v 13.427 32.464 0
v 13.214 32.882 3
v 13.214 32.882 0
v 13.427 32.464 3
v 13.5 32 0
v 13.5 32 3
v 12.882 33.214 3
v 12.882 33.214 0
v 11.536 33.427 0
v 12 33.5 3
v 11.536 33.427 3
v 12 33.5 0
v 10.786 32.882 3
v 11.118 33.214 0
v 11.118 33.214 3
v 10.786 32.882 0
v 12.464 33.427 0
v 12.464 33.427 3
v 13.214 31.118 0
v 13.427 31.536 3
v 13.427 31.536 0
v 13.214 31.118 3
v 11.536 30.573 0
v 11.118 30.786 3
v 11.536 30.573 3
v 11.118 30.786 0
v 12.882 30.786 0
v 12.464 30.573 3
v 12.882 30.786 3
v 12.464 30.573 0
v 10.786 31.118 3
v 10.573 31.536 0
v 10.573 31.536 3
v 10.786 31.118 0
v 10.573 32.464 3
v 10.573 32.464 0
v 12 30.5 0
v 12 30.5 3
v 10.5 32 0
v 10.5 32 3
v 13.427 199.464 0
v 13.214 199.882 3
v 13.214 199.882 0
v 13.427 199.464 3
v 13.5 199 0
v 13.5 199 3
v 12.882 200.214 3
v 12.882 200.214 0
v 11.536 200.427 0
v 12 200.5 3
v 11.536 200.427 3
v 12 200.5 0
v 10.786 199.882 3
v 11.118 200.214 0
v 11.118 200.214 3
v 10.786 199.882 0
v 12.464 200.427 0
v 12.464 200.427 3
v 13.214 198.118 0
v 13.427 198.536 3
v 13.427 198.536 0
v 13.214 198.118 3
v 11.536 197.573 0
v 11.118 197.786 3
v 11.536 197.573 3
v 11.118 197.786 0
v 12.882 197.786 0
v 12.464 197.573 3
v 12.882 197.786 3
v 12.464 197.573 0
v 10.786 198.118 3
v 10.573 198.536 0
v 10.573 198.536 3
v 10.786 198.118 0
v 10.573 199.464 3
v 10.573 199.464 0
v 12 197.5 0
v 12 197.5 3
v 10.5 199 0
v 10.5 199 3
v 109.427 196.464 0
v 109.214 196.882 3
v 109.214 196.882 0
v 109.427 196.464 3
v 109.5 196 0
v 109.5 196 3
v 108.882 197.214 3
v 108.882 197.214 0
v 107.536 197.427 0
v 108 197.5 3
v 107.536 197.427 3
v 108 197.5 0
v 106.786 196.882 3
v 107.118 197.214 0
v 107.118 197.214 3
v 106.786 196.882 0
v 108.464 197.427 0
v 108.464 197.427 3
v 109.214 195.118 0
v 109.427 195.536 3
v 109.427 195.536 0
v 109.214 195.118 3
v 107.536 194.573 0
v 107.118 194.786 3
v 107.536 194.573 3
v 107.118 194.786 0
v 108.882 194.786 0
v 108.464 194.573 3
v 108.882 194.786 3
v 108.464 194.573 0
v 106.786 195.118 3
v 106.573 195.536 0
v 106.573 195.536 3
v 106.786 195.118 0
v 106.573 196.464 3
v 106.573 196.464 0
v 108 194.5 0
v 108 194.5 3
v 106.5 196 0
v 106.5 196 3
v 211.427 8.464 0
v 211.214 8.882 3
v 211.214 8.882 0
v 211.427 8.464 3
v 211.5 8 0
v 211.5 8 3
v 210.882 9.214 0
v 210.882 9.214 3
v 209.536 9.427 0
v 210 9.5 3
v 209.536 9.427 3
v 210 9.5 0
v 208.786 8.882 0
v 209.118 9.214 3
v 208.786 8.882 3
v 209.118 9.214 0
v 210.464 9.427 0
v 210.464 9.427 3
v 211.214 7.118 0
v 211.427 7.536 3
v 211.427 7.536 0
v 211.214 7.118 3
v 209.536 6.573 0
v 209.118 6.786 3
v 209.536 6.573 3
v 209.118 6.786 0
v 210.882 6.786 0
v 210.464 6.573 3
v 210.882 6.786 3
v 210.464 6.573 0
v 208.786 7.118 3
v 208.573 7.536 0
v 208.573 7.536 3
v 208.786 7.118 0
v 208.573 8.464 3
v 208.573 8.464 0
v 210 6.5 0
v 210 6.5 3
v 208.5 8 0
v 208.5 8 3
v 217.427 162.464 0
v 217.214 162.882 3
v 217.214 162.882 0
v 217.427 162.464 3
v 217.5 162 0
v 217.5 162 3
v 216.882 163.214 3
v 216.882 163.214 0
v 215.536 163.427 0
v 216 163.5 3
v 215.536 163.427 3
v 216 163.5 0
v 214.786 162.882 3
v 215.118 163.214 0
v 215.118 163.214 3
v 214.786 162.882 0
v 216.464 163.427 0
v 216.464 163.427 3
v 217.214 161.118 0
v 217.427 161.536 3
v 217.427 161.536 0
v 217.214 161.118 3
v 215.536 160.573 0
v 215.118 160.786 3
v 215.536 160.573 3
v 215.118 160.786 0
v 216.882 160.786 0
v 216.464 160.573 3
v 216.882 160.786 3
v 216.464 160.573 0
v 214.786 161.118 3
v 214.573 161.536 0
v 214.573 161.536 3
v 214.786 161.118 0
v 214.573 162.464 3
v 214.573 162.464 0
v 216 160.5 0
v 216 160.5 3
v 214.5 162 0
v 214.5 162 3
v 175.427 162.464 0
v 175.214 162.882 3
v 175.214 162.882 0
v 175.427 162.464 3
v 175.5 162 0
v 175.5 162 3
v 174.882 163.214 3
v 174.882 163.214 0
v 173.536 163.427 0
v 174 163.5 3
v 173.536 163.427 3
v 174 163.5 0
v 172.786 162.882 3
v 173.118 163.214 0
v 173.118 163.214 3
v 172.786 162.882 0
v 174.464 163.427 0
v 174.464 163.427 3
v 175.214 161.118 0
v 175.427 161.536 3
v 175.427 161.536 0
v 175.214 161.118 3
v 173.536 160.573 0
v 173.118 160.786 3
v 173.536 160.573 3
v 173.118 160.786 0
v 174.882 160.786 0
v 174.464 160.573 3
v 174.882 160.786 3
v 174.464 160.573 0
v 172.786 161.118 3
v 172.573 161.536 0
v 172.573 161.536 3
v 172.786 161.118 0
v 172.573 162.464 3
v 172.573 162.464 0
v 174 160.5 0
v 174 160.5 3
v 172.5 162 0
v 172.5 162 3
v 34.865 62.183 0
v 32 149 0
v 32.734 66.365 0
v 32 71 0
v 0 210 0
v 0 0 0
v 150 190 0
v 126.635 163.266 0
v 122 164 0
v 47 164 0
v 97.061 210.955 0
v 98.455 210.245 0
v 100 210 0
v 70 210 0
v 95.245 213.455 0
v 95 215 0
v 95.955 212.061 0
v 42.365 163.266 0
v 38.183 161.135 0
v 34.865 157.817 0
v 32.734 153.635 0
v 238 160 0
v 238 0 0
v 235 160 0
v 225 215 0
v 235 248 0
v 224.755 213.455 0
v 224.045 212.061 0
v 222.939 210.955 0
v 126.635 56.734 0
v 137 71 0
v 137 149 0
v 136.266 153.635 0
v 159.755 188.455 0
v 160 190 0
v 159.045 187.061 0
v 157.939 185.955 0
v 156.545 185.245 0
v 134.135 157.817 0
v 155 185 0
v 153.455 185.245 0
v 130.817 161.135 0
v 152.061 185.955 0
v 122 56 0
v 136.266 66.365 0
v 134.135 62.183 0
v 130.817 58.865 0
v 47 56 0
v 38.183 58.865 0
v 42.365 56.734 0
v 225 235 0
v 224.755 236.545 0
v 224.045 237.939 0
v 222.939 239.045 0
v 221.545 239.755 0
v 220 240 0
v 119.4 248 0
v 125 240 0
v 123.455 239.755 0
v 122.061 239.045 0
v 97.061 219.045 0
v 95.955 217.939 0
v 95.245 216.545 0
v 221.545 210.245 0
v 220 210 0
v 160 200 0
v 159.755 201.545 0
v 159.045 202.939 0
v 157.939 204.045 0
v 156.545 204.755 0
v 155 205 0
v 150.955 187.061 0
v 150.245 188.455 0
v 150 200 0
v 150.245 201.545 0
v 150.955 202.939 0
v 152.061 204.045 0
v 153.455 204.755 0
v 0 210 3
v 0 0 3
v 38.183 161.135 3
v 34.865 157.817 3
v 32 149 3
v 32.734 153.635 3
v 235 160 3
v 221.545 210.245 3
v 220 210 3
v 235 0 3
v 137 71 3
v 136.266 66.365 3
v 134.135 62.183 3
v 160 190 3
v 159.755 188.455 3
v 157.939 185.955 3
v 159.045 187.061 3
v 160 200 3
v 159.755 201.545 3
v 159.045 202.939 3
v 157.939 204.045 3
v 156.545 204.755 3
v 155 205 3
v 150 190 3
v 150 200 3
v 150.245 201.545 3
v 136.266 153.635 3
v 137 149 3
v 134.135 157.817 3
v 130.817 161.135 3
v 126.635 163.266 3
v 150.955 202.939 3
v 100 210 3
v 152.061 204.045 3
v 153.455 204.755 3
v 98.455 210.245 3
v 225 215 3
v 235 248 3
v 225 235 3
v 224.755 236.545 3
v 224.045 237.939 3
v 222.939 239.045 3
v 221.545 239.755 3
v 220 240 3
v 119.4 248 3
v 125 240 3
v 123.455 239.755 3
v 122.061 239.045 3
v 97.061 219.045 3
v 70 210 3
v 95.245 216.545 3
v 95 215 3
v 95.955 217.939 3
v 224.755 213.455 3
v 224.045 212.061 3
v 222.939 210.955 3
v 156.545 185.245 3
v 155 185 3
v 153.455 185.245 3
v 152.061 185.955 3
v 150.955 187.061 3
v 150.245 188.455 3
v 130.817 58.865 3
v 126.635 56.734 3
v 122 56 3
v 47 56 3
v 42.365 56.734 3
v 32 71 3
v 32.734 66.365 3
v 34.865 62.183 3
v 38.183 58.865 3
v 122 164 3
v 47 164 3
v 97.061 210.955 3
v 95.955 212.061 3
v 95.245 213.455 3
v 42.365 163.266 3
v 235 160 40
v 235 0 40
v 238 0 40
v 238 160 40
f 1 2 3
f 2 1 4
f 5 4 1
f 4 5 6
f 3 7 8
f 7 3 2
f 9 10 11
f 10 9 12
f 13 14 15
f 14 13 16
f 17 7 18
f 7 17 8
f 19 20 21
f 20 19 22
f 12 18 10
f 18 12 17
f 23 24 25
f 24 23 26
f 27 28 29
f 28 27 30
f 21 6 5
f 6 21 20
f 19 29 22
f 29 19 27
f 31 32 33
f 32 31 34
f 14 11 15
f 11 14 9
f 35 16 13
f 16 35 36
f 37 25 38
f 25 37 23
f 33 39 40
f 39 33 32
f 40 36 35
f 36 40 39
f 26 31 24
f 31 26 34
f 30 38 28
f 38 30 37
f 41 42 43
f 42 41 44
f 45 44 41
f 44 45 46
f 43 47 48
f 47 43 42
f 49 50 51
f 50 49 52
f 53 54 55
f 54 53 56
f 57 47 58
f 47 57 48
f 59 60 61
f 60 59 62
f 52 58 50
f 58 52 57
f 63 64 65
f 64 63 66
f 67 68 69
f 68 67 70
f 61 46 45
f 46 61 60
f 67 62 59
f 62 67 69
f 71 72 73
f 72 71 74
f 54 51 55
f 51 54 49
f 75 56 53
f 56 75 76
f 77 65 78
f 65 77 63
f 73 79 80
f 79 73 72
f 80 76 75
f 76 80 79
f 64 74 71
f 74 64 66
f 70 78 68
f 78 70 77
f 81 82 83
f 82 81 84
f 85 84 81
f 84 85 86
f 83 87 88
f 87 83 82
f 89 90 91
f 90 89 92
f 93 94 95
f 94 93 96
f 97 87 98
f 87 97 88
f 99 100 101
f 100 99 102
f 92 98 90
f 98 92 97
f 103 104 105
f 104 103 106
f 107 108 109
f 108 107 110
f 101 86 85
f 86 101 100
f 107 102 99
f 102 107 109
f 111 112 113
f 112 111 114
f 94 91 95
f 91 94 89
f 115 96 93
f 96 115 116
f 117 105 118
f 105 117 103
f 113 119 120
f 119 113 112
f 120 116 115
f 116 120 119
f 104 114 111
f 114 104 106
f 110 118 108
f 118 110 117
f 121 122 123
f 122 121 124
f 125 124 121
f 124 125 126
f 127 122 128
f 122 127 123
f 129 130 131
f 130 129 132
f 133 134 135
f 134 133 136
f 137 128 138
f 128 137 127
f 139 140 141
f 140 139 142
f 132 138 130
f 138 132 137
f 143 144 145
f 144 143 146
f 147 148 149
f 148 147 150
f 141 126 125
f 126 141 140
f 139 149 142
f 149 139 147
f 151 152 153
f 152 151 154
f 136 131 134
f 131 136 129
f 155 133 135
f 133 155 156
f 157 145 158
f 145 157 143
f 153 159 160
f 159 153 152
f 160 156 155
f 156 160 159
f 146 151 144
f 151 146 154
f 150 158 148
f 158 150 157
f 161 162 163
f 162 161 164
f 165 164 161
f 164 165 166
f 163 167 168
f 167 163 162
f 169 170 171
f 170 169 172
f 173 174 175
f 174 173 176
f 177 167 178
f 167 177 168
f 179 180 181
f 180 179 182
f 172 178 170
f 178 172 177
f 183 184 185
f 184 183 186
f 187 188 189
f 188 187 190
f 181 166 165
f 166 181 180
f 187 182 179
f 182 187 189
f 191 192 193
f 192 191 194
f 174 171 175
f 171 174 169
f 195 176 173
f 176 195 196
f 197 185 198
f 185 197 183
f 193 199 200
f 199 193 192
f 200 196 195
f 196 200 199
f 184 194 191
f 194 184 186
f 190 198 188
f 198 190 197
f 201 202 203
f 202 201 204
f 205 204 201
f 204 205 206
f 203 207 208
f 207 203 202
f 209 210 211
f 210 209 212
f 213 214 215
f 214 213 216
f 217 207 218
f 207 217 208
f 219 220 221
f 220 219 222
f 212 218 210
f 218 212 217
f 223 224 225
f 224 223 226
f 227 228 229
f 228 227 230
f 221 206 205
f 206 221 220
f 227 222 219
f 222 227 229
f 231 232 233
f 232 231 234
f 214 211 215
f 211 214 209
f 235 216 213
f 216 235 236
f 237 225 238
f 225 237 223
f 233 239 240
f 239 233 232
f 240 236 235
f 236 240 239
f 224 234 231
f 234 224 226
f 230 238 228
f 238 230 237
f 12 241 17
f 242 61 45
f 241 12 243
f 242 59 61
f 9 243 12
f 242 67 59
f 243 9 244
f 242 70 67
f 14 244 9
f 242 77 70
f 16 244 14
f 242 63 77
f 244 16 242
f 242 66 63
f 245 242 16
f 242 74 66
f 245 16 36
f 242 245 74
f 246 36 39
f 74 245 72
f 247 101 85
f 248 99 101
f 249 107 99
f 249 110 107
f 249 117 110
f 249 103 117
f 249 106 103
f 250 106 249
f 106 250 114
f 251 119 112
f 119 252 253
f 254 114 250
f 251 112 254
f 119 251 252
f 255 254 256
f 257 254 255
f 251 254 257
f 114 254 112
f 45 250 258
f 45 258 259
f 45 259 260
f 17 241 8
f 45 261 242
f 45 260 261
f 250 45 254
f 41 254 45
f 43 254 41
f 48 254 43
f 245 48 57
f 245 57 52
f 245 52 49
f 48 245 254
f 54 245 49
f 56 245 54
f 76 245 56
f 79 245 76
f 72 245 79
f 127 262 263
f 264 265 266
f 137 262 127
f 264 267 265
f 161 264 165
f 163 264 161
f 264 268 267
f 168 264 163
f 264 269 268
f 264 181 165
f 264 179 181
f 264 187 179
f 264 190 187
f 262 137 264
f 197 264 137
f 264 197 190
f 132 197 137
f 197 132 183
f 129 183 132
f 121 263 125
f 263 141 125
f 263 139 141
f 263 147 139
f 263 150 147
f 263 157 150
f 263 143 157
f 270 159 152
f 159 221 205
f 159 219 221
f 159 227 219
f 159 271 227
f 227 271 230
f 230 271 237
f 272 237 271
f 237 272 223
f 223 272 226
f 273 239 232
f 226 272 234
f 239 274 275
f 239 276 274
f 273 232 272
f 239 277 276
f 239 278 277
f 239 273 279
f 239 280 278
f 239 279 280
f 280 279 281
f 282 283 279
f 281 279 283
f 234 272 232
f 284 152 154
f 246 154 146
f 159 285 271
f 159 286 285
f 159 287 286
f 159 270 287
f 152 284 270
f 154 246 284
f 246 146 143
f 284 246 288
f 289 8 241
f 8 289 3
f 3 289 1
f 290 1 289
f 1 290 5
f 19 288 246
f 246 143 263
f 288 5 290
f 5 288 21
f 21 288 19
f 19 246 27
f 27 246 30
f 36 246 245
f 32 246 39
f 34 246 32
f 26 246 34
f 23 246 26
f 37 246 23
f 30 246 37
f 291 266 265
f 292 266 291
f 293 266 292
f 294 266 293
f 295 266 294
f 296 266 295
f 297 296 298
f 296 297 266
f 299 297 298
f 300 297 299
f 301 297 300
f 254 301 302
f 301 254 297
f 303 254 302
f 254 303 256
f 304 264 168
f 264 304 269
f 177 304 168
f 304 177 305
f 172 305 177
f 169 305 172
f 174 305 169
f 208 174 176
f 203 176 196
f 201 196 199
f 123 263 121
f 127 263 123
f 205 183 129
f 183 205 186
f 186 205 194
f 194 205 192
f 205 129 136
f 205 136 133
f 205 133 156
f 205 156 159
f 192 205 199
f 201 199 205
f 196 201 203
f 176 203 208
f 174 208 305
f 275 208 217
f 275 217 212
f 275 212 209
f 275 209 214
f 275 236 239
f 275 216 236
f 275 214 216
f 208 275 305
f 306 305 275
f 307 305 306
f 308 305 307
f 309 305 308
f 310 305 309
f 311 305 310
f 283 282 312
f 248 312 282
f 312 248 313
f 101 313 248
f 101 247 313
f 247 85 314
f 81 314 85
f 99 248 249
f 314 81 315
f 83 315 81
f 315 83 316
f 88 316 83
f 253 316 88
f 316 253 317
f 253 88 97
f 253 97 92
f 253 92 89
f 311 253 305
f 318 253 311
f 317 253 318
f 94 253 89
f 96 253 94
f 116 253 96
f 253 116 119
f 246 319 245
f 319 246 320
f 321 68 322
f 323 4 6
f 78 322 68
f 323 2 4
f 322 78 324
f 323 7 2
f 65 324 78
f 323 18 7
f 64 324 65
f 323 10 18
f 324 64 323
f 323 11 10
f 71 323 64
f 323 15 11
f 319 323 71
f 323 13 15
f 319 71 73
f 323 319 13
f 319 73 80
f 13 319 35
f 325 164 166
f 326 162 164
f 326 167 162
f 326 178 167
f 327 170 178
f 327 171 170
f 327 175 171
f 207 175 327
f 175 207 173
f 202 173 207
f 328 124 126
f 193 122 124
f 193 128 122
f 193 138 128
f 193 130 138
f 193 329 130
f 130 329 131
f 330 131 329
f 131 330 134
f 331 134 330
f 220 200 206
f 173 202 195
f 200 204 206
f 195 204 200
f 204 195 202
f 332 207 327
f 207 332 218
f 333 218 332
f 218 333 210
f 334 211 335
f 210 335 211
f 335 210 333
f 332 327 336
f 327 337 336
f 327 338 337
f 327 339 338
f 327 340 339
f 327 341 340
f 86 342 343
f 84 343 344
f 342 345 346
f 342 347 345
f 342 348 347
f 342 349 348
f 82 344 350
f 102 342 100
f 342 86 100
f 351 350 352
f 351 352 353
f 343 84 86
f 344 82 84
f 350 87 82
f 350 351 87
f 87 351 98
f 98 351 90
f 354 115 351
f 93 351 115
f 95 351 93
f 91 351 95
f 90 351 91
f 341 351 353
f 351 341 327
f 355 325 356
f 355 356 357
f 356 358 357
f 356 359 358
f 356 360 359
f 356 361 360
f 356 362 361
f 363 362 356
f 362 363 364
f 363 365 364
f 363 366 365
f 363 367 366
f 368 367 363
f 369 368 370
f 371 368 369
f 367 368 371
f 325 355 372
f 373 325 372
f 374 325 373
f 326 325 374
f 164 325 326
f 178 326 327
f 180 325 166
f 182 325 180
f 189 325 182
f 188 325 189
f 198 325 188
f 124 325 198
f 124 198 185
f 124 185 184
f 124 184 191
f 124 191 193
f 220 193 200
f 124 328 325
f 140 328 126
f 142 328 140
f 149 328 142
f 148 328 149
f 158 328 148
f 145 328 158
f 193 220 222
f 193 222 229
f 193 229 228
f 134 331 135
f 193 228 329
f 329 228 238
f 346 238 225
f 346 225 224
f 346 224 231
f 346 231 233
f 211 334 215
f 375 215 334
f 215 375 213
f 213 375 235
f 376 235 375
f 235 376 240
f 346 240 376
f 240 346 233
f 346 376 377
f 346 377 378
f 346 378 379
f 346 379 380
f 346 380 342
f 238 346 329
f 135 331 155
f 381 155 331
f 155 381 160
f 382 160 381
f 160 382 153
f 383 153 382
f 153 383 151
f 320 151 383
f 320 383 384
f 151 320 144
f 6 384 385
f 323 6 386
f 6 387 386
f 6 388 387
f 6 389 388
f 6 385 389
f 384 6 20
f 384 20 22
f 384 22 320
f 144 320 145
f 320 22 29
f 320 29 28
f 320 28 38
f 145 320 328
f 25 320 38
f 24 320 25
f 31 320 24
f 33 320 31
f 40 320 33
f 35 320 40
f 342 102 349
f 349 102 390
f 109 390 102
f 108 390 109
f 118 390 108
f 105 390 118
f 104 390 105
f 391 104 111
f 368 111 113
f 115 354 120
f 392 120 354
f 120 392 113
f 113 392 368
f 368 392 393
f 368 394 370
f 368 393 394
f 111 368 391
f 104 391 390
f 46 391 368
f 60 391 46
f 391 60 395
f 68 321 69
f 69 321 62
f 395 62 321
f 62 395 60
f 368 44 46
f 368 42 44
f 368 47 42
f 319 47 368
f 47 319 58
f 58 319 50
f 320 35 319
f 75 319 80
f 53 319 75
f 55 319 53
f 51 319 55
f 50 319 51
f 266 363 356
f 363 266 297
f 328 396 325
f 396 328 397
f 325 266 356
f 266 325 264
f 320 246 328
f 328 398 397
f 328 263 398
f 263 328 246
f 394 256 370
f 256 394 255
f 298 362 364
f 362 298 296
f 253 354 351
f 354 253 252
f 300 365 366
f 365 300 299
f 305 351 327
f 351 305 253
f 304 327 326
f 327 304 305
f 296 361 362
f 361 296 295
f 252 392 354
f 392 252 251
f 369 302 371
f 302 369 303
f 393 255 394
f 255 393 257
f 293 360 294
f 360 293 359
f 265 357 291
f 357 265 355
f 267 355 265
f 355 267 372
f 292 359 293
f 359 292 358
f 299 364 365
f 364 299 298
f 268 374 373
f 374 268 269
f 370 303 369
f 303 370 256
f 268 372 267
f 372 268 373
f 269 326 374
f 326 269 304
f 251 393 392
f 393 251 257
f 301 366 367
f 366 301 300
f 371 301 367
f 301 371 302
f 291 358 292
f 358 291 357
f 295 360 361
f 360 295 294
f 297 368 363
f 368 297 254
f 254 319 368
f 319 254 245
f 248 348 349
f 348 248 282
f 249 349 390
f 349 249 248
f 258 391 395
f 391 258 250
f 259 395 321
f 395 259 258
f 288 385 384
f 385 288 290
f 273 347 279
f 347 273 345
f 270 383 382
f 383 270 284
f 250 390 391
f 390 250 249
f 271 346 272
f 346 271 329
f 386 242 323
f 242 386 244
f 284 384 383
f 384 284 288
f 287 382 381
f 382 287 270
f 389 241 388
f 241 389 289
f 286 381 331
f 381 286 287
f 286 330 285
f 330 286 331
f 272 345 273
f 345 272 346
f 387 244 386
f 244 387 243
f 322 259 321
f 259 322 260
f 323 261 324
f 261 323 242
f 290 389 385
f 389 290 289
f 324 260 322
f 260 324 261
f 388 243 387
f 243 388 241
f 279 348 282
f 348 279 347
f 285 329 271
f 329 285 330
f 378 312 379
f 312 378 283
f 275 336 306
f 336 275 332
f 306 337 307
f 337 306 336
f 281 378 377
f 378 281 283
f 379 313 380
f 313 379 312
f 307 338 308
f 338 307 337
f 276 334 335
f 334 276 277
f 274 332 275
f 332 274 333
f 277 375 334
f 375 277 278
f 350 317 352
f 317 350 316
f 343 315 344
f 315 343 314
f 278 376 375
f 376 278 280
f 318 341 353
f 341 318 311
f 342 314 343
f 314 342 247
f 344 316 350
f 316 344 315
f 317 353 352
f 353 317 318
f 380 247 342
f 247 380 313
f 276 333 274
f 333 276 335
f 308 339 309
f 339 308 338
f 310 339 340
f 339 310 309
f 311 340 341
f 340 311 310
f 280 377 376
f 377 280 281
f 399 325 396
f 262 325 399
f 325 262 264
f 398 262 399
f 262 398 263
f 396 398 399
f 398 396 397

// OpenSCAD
// file: ssd.scad
module ssd(h){

    difference(){

        translate([5,5]){
            linear_extrude(h){
                minkowski(){
                    square([59.85, 90.45]);
                    circle(5);
                }
            }
        }

        translate([12,-1,-1])
            cube([33.69, 3.25, 6]);

    }

}
// file: optiplexmotherboard.scad
volt  = 2;
cpu_volt  = 20;
mobo_h = 1.57;


$fn = 25;


module mobo_contour(){
    linear_extrude(height=mobo_h)
        polygon(points=[[0,0],[220,0],[220,186],[146,186],[146,205],[0,205]]);

}

psu_bolt = [220-49,186-24];
bolts =  [[9,32], [9,205-6], 
          [0+105,205-9], [220-13,0+8],
          [220-7,186-24], [220-49,186-24], psu_bolt];
cpu_bolts =  [[44,71],
              [44,149], 
              [220-101,71],
              [220-101,149]];

module mobo(){

    difference( ) {
         
        mobo_contour();
        
        for (pos = bolts){
            translate(pos) 
                cylinder(  r=volt, h=100, center=true);
        }
        
        for (pos = cpu_bolts){
            translate(pos) 
                cylinder(  r=volt, h=100, center=true);
        }
    }
}
// main file
include <optiplexmotherboard.scad>
include <ssd.scad>

$fn = 20;

board_offset = [3, 0];
blade_thickness = 3;
standof_h = 5;

// the blade itself
difference(){
    

    linear_extrude(height=blade_thickness)
        square([235,248]);

    hull(){
        translate([220,215])
            cylinder(r=5, h=15, center=true);
        translate([220,235])
            cylinder(r=5, h=15, center=true);
        translate([100,215])
            cylinder(r=5, h=15, center=true);          
        translate([125,235])
            cylinder(r=5, h=15, center=true);
    }

    translate([0,0,-1])
        linear_extrude(height=blade_thickness+10)
            polygon([[-1,210], [70,210], [135,260], [-1,260]]);

    hull(){
        for(bolt = cpu_bolts){
            translate (bolt+ board_offset)
                cylinder (r=15, h=15, center = true);
        }
    }
    
    for(bolt = bolts){
        translate (bolt+ board_offset)
           cylinder (r=1.5, h=15, center = true);
    }
    
    hull(){
        translate ([155, 190])
            cylinder (r=5, h=15, center = true);
        translate ([155, 200])
            cylinder (r=5, h=15, center = true);

    }
}

translate([238,0,0])
rotate([0,270,0])
linear_extrude(height=blade_thickness)
    square([40,160]);


// this is the motheraboard with the standofs
translate (board_offset)
rotate([180,0,0])
translate ([0,-210]){
    
    // mobo
    translate ([0,0,standof_h])
  %      mobo();
    
    // standofss
    for(bolt = bolts)
        translate(bolt)
   %         cylinder(r=2.5, h=standof_h);
    
    translate ([0,0, standof_h + mobo_h])
    translate (psu_bolt)
    %        cylinder(r=2.5, h=10);
    
    //psu    
    translate ([220-55, 0]){
        y = 186-30;    
        translate ([0,0, standof_h + mobo_h + 10])
            % cube ([65,y,35]);
    }
}

//hdd
translate ([150,180, -0.5])
    rotate([0,180,180])
     %   ssd(h=7);   
